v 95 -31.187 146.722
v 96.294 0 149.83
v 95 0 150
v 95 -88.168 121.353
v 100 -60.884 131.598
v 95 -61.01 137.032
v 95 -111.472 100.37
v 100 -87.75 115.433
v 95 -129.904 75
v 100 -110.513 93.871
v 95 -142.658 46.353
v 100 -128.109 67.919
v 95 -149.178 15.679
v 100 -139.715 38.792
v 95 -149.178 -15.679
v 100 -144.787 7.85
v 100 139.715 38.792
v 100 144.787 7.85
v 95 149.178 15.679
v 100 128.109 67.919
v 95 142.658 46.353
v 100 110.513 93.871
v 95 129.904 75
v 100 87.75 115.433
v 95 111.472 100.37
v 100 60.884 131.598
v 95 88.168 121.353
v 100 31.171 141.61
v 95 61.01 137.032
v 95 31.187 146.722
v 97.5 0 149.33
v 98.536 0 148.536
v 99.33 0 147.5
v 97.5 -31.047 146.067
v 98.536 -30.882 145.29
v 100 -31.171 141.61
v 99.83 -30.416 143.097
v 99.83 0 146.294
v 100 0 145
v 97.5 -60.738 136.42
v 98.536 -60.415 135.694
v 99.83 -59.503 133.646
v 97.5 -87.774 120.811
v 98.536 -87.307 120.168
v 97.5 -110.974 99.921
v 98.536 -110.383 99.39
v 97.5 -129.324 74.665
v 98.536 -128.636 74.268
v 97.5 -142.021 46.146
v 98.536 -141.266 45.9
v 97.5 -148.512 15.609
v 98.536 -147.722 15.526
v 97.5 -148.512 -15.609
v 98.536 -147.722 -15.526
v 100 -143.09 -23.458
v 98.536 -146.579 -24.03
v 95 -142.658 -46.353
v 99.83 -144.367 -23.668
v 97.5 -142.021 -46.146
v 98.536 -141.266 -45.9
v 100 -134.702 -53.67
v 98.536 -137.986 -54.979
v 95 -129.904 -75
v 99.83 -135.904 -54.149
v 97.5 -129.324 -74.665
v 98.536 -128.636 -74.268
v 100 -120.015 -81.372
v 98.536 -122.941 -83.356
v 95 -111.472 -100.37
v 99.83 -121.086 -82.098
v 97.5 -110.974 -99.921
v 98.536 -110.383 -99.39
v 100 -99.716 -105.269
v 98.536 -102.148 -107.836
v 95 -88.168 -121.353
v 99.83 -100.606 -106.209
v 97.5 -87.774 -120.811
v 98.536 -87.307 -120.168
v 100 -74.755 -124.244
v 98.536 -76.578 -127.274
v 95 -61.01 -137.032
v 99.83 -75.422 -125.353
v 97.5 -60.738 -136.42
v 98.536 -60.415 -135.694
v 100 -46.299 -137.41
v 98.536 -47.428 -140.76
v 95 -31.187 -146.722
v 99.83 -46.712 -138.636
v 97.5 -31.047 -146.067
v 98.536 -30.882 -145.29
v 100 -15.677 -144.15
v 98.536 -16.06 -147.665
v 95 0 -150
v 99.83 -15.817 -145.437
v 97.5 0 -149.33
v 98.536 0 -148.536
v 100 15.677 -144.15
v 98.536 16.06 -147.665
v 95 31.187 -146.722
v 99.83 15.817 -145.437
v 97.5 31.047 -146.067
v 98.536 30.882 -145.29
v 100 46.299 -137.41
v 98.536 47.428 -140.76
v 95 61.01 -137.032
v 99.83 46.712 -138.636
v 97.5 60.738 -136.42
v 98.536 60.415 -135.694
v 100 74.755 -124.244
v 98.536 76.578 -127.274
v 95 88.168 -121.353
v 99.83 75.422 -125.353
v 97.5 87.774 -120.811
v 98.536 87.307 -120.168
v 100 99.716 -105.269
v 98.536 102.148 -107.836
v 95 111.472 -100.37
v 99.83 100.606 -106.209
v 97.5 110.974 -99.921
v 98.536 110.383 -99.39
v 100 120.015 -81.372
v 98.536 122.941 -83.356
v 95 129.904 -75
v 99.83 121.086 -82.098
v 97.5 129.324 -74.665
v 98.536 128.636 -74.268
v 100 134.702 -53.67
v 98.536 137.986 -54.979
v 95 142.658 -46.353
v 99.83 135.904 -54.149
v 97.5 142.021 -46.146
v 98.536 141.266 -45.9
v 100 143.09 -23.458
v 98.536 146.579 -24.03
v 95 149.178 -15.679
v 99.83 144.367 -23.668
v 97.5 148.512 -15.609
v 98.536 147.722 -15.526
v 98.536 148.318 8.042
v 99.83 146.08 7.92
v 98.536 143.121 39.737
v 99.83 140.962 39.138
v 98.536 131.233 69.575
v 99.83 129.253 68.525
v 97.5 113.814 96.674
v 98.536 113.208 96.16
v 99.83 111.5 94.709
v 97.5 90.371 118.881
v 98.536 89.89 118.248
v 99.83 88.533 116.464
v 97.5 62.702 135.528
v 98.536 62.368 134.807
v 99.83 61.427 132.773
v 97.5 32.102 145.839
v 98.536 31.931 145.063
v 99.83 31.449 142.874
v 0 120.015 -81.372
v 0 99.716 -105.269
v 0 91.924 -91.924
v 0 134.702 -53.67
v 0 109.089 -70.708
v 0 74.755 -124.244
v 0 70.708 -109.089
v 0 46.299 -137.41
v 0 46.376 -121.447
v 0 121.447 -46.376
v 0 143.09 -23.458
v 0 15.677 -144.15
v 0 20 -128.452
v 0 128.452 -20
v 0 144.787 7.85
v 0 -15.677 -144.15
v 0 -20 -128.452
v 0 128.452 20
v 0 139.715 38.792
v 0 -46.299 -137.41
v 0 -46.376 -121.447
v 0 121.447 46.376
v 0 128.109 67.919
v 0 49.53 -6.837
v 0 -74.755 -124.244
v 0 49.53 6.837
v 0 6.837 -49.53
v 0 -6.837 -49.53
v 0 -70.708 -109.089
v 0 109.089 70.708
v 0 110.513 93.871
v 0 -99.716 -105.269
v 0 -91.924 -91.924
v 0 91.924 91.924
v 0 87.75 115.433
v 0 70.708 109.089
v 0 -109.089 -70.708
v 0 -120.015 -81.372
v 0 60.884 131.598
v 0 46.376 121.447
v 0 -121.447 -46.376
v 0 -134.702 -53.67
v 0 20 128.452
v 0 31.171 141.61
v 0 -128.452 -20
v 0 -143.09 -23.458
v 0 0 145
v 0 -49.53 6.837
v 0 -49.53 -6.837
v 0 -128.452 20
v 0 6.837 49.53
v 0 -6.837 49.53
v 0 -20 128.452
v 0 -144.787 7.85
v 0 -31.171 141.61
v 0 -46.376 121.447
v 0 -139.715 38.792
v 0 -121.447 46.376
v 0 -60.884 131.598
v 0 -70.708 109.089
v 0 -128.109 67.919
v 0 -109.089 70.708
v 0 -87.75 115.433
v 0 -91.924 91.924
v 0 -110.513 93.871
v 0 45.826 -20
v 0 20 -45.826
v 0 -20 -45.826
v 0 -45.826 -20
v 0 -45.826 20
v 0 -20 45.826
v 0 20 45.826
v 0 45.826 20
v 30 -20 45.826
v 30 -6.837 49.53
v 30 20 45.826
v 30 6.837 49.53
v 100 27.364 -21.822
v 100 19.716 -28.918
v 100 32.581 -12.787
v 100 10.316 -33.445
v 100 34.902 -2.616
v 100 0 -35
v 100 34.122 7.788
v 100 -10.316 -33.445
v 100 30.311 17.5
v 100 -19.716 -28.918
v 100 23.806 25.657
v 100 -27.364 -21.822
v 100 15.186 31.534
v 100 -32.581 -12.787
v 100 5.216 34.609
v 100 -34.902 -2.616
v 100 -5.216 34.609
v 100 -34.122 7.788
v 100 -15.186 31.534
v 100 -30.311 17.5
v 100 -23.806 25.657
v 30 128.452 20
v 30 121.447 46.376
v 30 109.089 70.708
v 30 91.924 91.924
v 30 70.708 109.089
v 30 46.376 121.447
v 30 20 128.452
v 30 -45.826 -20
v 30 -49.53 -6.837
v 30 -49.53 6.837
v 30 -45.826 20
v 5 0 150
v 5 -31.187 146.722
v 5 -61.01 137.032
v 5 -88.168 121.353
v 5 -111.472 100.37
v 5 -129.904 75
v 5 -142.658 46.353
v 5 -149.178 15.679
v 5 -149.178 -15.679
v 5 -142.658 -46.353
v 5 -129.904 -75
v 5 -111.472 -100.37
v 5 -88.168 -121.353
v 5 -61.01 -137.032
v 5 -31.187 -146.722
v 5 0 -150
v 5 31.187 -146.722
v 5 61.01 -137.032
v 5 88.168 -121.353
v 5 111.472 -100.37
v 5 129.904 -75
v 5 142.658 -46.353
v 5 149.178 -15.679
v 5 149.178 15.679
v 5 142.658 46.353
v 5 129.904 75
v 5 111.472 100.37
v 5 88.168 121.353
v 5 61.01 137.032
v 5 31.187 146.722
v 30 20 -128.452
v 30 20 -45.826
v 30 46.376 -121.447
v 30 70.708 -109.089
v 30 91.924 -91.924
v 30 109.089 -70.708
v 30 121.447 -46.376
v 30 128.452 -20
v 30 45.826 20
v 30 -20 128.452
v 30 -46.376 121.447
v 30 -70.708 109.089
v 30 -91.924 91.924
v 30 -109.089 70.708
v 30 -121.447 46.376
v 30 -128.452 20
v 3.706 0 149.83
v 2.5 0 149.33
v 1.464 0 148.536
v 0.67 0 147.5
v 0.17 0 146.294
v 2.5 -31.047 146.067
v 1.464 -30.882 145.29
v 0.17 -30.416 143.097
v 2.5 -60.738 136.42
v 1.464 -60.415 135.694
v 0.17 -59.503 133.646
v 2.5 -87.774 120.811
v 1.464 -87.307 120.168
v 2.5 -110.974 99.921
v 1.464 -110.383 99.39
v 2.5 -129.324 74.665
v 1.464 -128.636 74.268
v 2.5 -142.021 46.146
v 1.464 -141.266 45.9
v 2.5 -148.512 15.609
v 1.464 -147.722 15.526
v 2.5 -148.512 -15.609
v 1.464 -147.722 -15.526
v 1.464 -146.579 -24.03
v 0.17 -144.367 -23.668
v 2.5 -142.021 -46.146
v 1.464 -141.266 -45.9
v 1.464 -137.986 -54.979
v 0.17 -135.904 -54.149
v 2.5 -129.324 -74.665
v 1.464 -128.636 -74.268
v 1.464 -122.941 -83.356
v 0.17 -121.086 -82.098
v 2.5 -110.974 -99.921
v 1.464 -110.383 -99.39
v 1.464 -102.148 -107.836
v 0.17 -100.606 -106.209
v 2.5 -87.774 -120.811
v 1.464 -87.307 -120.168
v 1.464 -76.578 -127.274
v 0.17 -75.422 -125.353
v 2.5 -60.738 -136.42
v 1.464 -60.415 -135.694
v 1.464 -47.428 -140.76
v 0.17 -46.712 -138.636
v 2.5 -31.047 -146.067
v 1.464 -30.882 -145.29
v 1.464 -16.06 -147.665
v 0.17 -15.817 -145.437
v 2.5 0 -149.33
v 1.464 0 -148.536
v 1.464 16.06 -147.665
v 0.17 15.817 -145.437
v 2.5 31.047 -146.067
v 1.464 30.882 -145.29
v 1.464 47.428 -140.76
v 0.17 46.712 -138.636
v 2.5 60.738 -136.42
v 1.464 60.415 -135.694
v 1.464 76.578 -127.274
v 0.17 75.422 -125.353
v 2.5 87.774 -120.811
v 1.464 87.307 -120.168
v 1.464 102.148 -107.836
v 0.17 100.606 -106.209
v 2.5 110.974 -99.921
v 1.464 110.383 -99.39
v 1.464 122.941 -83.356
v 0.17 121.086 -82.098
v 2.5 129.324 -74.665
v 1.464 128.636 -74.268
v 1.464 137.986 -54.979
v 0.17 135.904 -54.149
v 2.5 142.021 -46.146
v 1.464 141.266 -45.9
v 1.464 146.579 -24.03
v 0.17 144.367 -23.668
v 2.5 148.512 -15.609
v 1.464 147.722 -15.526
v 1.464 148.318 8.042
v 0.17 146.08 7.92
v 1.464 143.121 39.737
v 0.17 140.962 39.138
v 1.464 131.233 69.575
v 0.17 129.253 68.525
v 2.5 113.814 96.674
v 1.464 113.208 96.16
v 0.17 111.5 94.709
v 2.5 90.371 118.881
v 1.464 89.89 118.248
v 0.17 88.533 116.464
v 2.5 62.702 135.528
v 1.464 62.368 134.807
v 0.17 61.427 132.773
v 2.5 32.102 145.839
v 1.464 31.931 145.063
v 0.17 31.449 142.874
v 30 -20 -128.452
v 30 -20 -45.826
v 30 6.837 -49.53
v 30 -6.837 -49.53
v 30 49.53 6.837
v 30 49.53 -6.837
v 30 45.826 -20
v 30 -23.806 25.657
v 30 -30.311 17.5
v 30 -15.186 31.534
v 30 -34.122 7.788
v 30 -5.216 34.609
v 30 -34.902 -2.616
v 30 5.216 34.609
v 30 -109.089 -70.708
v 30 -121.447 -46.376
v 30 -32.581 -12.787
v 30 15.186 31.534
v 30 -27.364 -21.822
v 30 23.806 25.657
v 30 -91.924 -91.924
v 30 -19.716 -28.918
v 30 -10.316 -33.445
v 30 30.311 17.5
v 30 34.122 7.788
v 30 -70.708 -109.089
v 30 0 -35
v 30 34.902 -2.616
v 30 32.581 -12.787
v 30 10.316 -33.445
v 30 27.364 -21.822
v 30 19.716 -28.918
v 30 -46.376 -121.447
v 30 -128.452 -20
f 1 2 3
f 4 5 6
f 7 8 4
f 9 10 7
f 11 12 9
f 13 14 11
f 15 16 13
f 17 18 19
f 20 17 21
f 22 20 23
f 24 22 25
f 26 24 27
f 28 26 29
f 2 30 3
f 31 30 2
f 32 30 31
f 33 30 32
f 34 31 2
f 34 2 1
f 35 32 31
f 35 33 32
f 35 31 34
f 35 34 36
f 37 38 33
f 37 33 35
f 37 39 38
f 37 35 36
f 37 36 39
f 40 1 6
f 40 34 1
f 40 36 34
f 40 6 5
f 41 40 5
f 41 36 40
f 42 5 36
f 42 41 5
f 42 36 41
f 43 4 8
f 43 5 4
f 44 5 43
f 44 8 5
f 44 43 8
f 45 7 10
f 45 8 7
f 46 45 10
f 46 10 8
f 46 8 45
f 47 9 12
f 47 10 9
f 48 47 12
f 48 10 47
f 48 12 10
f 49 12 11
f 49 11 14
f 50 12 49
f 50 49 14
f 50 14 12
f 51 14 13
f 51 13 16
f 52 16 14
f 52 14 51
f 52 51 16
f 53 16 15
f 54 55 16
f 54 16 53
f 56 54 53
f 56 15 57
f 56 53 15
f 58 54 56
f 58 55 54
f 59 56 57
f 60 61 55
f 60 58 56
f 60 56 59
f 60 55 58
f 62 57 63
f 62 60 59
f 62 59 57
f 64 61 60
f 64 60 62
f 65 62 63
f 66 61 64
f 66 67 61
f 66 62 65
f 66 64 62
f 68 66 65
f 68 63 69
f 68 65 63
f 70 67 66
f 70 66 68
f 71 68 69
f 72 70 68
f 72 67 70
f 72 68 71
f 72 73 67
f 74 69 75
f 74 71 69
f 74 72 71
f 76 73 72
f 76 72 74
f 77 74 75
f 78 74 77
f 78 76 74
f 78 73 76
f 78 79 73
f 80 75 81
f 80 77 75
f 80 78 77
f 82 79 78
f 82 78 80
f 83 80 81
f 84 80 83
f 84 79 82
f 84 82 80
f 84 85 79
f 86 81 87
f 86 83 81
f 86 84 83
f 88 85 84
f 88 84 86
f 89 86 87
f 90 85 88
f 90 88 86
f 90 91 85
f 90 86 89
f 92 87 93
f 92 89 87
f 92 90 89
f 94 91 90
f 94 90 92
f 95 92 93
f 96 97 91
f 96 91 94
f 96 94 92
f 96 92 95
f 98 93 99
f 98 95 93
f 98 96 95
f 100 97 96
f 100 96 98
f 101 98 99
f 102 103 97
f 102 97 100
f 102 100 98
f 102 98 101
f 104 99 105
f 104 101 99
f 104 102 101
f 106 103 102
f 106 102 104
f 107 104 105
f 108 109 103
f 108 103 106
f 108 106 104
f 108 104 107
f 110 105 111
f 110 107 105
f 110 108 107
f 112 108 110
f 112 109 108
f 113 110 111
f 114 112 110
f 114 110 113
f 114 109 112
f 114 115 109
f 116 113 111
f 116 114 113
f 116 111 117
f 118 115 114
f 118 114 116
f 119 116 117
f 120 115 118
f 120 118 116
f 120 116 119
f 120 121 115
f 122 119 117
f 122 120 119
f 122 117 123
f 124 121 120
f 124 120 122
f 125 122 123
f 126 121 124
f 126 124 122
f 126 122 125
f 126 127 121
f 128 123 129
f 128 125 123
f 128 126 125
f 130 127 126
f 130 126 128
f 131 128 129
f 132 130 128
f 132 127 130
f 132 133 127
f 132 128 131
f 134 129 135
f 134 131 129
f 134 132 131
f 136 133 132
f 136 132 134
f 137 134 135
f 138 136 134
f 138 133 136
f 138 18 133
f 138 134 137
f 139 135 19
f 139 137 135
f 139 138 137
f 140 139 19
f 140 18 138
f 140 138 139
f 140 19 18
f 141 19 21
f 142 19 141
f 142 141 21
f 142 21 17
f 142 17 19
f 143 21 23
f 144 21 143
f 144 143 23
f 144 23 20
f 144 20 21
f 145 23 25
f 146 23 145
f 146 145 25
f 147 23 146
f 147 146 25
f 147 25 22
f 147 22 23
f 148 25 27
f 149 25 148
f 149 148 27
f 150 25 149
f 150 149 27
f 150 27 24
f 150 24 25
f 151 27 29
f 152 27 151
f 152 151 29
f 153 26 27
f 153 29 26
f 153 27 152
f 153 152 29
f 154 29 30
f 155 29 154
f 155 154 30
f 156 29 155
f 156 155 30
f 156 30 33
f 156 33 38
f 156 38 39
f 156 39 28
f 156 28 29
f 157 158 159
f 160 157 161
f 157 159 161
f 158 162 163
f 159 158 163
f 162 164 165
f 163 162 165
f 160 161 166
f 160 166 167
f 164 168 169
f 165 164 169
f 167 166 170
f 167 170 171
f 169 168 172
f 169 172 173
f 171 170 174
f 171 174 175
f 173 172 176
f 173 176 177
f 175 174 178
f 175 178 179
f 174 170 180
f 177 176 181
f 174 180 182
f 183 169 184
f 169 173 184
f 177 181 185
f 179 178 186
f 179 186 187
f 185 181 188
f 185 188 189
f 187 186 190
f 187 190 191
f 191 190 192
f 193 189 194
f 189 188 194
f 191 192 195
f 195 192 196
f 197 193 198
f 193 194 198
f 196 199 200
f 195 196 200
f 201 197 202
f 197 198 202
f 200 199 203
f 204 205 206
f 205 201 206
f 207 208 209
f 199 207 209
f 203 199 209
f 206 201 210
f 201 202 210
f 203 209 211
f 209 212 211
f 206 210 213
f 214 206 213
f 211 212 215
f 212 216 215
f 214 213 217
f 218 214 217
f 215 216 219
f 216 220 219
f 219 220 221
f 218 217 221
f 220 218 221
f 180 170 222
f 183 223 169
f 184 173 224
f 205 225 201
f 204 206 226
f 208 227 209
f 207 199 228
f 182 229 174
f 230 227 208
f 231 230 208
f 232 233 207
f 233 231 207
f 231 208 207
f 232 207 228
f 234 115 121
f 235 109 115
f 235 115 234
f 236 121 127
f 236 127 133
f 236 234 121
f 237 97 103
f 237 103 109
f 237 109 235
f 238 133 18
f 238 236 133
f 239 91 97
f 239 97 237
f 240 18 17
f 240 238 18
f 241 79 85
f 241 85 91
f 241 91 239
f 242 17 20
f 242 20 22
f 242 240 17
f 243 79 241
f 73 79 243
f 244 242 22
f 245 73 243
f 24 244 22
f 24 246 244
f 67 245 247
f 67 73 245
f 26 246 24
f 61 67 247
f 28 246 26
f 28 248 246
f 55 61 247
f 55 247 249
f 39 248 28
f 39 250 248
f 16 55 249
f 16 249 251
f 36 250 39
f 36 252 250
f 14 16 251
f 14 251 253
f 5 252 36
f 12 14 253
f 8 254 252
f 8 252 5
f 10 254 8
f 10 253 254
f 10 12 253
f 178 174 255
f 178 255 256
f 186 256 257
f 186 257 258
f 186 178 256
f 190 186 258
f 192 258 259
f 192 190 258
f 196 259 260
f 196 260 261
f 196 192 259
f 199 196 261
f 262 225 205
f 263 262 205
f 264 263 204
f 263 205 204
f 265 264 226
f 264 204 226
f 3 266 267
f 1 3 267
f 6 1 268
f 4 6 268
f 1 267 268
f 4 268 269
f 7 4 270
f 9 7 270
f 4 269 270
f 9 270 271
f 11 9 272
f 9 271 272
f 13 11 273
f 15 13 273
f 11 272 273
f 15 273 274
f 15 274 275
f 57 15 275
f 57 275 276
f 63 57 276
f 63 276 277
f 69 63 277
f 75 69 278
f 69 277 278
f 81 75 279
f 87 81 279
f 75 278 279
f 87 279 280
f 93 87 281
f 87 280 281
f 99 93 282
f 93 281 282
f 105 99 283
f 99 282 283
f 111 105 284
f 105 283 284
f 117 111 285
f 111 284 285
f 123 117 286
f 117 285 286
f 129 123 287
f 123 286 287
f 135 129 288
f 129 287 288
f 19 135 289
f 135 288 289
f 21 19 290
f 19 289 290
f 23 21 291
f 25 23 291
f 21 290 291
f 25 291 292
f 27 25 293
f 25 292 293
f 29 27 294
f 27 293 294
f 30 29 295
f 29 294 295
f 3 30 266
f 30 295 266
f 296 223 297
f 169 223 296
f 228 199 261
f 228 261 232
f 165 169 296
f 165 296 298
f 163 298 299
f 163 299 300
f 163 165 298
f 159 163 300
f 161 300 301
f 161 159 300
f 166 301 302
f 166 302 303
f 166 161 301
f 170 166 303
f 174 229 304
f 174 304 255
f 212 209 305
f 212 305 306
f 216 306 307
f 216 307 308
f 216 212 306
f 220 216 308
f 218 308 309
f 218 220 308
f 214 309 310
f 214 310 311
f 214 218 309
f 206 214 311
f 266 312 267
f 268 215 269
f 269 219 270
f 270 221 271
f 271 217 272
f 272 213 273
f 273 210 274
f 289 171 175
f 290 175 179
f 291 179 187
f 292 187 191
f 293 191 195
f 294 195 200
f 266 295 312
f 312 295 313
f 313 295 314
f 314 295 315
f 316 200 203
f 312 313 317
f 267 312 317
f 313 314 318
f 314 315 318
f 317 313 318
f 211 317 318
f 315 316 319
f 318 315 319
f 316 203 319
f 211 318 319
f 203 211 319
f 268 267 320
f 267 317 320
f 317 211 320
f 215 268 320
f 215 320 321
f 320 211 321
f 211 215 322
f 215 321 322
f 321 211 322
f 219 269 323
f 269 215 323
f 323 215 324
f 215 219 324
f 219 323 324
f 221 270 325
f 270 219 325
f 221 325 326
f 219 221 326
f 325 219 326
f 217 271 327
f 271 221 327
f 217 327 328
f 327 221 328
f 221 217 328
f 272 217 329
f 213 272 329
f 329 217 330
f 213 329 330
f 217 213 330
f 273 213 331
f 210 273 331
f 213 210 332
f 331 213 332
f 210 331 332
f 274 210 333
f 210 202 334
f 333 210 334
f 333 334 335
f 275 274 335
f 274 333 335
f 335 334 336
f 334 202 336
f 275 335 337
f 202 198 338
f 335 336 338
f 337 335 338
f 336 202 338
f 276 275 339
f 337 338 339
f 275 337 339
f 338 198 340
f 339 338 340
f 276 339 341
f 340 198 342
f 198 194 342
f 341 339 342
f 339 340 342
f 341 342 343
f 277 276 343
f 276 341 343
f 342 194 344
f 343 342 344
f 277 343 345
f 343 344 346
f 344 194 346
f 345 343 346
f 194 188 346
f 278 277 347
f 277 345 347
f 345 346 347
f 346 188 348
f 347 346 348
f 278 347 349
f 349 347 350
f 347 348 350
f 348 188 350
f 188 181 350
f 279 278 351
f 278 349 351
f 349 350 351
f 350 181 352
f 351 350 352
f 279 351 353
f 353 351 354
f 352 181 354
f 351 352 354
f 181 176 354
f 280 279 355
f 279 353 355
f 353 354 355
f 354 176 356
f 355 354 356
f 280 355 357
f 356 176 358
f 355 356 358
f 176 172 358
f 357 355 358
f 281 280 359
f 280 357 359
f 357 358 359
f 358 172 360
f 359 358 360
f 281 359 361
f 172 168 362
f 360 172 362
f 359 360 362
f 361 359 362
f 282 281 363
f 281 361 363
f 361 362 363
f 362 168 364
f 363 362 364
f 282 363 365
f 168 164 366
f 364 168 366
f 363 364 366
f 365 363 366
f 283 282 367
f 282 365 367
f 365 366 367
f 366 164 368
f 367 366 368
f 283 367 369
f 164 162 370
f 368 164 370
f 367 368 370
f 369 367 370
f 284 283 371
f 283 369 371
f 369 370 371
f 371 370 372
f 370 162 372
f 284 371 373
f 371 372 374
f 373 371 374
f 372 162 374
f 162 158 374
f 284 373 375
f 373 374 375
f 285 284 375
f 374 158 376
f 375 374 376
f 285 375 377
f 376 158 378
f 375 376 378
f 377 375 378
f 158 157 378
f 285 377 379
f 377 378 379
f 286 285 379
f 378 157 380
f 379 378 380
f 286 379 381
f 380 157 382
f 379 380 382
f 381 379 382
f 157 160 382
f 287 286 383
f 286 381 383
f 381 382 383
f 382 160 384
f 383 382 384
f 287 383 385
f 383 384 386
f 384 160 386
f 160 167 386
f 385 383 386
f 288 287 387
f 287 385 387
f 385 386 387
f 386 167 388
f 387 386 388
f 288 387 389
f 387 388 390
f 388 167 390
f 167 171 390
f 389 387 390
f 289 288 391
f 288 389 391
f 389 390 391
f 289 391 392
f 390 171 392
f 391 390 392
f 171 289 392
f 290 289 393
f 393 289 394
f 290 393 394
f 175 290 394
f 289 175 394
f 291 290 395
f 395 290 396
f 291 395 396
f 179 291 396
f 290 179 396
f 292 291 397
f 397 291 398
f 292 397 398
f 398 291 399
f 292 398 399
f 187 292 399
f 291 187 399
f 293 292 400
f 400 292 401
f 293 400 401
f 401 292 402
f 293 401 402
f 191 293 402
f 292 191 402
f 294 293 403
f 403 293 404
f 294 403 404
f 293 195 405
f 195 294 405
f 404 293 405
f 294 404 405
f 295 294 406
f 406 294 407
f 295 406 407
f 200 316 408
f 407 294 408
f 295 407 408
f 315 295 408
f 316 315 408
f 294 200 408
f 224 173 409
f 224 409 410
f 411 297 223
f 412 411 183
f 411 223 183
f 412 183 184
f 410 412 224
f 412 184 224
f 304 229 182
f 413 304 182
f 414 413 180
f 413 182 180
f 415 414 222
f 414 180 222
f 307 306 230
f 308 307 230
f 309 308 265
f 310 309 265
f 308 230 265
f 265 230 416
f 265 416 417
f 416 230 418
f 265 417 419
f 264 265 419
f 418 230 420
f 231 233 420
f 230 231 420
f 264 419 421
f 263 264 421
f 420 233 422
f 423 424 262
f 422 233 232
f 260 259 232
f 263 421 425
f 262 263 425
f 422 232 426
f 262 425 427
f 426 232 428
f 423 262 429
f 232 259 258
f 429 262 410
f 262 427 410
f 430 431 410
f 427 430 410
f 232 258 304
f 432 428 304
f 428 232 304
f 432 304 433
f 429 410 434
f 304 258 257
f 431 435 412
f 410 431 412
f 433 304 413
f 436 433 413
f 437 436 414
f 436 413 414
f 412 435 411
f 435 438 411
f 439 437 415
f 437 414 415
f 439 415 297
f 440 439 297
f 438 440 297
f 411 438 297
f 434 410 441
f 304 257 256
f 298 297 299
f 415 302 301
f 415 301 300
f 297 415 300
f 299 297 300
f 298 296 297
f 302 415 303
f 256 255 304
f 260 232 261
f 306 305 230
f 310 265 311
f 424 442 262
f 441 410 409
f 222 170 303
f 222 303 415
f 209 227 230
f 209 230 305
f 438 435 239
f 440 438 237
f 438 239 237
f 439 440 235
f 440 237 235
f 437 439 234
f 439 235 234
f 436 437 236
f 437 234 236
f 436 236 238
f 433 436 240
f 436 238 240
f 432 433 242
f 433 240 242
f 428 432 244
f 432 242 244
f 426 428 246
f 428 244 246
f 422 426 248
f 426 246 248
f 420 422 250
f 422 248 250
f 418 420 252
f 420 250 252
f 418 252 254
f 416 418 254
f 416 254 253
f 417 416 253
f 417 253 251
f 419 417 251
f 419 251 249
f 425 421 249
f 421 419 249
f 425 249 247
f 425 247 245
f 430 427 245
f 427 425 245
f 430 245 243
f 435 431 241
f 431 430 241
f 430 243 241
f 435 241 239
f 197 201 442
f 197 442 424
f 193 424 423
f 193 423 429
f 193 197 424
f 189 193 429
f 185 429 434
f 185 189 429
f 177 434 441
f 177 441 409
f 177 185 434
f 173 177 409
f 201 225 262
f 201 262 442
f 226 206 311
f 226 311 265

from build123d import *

# Parameters (mm, degrees)
SKETCH2_R           = 150
BOSS_EXTRUDE2_DEPTH = 100
SKETCH1_R           = 35
BOSS_EXTRUDE1_DEPTH = 60
FILLET1_R           = 5
CUT_EXTRUDE4_DEPTH  = 30
CIRPATTERN2_COUNT   = 4
SKETCH8_R           = 35
CUT_EXTRUDE5_DEPTH  = 266.706605172
SKETCH9_R           = 50
CUT_EXTRUDE6_DEPTH  = 30


with BuildPart() as part:
    # Sketch2 → Boss-Extrude2 (new body)
    with BuildSketch(Plane(origin=(0, 0, 0), x_dir=(0, 0, -1), z_dir=(1, 0, 0))):
        with Locations(Location((0, 0, 0), (0, 0, 180))):
            Circle(SKETCH2_R)
    extrude(amount=BOSS_EXTRUDE2_DEPTH)

    # Sketch1 → Boss-Extrude1 (add)
    with BuildSketch(Plane(origin=(100, 0, 0), x_dir=(0, 0, -1), z_dir=(1, 0, 0))):
        Circle(SKETCH1_R)
    extrude(amount=BOSS_EXTRUDE1_DEPTH)

    # Fillet1
    fillet1_edges = [part.edges().sort_by_distance(p)[0] for p in [
        (0, 0, -150),
        (100, 0, -150),
    ]]
    fillet(fillet1_edges, radius=FILLET1_R)

    # Sketch7 → Cut-Extrude4 (cut)
    with BuildSketch(Plane.ZY):
        with BuildLine():
            Line((-20, 128.452325787), (-20, 20))
            Line((-20, 20), (-128.452325787, 20))
            ThreePointArc((-128.452325787, 20), (-91.923881554, 91.923881554), (-20, 128.452325787))
        make_face()
    cut_extrude4 = extrude(amount=-CUT_EXTRUDE4_DEPTH, mode=Mode.SUBTRACT)

    # CirPattern2: Cut-Extrude4 ×4 about axis
    cirpattern2_axis = Axis((0, 0, 0), (1, 0, 0))
    for i in range(1, CIRPATTERN2_COUNT):
        add(cut_extrude4.rotate(cirpattern2_axis, i * 360 / CIRPATTERN2_COUNT), mode=Mode.SUBTRACT)

    # Sketch8 → Cut-Extrude5 (cut, through all)
    with BuildSketch(Plane(origin=(160, 0, 0), x_dir=(0, 0, -1), z_dir=(1, 0, 0))):
        Circle(SKETCH8_R)
    extrude(amount=-CUT_EXTRUDE5_DEPTH, mode=Mode.SUBTRACT)

    # Sketch9 → Cut-Extrude6 (cut)
    with BuildSketch(Plane.ZY):
        Circle(SKETCH9_R)
    extrude(amount=-CUT_EXTRUDE6_DEPTH, mode=Mode.SUBTRACT)


solid = part.part
